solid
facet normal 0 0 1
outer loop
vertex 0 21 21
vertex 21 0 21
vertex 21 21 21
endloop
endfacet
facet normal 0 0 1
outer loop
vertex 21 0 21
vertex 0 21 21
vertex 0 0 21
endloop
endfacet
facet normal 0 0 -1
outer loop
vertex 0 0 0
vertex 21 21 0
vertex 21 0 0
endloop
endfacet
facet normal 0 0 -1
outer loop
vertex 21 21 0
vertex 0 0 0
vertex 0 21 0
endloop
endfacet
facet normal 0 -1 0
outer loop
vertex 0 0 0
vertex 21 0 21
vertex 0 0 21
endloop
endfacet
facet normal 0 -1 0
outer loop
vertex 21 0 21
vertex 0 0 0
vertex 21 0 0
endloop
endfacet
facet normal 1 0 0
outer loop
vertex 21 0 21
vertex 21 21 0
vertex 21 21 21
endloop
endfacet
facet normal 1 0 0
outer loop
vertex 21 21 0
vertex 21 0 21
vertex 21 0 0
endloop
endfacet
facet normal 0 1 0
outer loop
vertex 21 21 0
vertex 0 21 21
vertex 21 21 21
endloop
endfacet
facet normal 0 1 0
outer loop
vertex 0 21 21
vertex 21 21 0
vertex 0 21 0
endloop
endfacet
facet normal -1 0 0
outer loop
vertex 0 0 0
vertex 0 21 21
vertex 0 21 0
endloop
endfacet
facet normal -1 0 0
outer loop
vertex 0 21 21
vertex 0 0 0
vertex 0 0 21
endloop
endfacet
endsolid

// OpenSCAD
// Construct: a recursive function (Fibonacci) sizing a cube.
function fib(n) = n < 2 ? n : fib(n - 1) + fib(n - 2);
cube(fib(8));   // fib(8) = 21
